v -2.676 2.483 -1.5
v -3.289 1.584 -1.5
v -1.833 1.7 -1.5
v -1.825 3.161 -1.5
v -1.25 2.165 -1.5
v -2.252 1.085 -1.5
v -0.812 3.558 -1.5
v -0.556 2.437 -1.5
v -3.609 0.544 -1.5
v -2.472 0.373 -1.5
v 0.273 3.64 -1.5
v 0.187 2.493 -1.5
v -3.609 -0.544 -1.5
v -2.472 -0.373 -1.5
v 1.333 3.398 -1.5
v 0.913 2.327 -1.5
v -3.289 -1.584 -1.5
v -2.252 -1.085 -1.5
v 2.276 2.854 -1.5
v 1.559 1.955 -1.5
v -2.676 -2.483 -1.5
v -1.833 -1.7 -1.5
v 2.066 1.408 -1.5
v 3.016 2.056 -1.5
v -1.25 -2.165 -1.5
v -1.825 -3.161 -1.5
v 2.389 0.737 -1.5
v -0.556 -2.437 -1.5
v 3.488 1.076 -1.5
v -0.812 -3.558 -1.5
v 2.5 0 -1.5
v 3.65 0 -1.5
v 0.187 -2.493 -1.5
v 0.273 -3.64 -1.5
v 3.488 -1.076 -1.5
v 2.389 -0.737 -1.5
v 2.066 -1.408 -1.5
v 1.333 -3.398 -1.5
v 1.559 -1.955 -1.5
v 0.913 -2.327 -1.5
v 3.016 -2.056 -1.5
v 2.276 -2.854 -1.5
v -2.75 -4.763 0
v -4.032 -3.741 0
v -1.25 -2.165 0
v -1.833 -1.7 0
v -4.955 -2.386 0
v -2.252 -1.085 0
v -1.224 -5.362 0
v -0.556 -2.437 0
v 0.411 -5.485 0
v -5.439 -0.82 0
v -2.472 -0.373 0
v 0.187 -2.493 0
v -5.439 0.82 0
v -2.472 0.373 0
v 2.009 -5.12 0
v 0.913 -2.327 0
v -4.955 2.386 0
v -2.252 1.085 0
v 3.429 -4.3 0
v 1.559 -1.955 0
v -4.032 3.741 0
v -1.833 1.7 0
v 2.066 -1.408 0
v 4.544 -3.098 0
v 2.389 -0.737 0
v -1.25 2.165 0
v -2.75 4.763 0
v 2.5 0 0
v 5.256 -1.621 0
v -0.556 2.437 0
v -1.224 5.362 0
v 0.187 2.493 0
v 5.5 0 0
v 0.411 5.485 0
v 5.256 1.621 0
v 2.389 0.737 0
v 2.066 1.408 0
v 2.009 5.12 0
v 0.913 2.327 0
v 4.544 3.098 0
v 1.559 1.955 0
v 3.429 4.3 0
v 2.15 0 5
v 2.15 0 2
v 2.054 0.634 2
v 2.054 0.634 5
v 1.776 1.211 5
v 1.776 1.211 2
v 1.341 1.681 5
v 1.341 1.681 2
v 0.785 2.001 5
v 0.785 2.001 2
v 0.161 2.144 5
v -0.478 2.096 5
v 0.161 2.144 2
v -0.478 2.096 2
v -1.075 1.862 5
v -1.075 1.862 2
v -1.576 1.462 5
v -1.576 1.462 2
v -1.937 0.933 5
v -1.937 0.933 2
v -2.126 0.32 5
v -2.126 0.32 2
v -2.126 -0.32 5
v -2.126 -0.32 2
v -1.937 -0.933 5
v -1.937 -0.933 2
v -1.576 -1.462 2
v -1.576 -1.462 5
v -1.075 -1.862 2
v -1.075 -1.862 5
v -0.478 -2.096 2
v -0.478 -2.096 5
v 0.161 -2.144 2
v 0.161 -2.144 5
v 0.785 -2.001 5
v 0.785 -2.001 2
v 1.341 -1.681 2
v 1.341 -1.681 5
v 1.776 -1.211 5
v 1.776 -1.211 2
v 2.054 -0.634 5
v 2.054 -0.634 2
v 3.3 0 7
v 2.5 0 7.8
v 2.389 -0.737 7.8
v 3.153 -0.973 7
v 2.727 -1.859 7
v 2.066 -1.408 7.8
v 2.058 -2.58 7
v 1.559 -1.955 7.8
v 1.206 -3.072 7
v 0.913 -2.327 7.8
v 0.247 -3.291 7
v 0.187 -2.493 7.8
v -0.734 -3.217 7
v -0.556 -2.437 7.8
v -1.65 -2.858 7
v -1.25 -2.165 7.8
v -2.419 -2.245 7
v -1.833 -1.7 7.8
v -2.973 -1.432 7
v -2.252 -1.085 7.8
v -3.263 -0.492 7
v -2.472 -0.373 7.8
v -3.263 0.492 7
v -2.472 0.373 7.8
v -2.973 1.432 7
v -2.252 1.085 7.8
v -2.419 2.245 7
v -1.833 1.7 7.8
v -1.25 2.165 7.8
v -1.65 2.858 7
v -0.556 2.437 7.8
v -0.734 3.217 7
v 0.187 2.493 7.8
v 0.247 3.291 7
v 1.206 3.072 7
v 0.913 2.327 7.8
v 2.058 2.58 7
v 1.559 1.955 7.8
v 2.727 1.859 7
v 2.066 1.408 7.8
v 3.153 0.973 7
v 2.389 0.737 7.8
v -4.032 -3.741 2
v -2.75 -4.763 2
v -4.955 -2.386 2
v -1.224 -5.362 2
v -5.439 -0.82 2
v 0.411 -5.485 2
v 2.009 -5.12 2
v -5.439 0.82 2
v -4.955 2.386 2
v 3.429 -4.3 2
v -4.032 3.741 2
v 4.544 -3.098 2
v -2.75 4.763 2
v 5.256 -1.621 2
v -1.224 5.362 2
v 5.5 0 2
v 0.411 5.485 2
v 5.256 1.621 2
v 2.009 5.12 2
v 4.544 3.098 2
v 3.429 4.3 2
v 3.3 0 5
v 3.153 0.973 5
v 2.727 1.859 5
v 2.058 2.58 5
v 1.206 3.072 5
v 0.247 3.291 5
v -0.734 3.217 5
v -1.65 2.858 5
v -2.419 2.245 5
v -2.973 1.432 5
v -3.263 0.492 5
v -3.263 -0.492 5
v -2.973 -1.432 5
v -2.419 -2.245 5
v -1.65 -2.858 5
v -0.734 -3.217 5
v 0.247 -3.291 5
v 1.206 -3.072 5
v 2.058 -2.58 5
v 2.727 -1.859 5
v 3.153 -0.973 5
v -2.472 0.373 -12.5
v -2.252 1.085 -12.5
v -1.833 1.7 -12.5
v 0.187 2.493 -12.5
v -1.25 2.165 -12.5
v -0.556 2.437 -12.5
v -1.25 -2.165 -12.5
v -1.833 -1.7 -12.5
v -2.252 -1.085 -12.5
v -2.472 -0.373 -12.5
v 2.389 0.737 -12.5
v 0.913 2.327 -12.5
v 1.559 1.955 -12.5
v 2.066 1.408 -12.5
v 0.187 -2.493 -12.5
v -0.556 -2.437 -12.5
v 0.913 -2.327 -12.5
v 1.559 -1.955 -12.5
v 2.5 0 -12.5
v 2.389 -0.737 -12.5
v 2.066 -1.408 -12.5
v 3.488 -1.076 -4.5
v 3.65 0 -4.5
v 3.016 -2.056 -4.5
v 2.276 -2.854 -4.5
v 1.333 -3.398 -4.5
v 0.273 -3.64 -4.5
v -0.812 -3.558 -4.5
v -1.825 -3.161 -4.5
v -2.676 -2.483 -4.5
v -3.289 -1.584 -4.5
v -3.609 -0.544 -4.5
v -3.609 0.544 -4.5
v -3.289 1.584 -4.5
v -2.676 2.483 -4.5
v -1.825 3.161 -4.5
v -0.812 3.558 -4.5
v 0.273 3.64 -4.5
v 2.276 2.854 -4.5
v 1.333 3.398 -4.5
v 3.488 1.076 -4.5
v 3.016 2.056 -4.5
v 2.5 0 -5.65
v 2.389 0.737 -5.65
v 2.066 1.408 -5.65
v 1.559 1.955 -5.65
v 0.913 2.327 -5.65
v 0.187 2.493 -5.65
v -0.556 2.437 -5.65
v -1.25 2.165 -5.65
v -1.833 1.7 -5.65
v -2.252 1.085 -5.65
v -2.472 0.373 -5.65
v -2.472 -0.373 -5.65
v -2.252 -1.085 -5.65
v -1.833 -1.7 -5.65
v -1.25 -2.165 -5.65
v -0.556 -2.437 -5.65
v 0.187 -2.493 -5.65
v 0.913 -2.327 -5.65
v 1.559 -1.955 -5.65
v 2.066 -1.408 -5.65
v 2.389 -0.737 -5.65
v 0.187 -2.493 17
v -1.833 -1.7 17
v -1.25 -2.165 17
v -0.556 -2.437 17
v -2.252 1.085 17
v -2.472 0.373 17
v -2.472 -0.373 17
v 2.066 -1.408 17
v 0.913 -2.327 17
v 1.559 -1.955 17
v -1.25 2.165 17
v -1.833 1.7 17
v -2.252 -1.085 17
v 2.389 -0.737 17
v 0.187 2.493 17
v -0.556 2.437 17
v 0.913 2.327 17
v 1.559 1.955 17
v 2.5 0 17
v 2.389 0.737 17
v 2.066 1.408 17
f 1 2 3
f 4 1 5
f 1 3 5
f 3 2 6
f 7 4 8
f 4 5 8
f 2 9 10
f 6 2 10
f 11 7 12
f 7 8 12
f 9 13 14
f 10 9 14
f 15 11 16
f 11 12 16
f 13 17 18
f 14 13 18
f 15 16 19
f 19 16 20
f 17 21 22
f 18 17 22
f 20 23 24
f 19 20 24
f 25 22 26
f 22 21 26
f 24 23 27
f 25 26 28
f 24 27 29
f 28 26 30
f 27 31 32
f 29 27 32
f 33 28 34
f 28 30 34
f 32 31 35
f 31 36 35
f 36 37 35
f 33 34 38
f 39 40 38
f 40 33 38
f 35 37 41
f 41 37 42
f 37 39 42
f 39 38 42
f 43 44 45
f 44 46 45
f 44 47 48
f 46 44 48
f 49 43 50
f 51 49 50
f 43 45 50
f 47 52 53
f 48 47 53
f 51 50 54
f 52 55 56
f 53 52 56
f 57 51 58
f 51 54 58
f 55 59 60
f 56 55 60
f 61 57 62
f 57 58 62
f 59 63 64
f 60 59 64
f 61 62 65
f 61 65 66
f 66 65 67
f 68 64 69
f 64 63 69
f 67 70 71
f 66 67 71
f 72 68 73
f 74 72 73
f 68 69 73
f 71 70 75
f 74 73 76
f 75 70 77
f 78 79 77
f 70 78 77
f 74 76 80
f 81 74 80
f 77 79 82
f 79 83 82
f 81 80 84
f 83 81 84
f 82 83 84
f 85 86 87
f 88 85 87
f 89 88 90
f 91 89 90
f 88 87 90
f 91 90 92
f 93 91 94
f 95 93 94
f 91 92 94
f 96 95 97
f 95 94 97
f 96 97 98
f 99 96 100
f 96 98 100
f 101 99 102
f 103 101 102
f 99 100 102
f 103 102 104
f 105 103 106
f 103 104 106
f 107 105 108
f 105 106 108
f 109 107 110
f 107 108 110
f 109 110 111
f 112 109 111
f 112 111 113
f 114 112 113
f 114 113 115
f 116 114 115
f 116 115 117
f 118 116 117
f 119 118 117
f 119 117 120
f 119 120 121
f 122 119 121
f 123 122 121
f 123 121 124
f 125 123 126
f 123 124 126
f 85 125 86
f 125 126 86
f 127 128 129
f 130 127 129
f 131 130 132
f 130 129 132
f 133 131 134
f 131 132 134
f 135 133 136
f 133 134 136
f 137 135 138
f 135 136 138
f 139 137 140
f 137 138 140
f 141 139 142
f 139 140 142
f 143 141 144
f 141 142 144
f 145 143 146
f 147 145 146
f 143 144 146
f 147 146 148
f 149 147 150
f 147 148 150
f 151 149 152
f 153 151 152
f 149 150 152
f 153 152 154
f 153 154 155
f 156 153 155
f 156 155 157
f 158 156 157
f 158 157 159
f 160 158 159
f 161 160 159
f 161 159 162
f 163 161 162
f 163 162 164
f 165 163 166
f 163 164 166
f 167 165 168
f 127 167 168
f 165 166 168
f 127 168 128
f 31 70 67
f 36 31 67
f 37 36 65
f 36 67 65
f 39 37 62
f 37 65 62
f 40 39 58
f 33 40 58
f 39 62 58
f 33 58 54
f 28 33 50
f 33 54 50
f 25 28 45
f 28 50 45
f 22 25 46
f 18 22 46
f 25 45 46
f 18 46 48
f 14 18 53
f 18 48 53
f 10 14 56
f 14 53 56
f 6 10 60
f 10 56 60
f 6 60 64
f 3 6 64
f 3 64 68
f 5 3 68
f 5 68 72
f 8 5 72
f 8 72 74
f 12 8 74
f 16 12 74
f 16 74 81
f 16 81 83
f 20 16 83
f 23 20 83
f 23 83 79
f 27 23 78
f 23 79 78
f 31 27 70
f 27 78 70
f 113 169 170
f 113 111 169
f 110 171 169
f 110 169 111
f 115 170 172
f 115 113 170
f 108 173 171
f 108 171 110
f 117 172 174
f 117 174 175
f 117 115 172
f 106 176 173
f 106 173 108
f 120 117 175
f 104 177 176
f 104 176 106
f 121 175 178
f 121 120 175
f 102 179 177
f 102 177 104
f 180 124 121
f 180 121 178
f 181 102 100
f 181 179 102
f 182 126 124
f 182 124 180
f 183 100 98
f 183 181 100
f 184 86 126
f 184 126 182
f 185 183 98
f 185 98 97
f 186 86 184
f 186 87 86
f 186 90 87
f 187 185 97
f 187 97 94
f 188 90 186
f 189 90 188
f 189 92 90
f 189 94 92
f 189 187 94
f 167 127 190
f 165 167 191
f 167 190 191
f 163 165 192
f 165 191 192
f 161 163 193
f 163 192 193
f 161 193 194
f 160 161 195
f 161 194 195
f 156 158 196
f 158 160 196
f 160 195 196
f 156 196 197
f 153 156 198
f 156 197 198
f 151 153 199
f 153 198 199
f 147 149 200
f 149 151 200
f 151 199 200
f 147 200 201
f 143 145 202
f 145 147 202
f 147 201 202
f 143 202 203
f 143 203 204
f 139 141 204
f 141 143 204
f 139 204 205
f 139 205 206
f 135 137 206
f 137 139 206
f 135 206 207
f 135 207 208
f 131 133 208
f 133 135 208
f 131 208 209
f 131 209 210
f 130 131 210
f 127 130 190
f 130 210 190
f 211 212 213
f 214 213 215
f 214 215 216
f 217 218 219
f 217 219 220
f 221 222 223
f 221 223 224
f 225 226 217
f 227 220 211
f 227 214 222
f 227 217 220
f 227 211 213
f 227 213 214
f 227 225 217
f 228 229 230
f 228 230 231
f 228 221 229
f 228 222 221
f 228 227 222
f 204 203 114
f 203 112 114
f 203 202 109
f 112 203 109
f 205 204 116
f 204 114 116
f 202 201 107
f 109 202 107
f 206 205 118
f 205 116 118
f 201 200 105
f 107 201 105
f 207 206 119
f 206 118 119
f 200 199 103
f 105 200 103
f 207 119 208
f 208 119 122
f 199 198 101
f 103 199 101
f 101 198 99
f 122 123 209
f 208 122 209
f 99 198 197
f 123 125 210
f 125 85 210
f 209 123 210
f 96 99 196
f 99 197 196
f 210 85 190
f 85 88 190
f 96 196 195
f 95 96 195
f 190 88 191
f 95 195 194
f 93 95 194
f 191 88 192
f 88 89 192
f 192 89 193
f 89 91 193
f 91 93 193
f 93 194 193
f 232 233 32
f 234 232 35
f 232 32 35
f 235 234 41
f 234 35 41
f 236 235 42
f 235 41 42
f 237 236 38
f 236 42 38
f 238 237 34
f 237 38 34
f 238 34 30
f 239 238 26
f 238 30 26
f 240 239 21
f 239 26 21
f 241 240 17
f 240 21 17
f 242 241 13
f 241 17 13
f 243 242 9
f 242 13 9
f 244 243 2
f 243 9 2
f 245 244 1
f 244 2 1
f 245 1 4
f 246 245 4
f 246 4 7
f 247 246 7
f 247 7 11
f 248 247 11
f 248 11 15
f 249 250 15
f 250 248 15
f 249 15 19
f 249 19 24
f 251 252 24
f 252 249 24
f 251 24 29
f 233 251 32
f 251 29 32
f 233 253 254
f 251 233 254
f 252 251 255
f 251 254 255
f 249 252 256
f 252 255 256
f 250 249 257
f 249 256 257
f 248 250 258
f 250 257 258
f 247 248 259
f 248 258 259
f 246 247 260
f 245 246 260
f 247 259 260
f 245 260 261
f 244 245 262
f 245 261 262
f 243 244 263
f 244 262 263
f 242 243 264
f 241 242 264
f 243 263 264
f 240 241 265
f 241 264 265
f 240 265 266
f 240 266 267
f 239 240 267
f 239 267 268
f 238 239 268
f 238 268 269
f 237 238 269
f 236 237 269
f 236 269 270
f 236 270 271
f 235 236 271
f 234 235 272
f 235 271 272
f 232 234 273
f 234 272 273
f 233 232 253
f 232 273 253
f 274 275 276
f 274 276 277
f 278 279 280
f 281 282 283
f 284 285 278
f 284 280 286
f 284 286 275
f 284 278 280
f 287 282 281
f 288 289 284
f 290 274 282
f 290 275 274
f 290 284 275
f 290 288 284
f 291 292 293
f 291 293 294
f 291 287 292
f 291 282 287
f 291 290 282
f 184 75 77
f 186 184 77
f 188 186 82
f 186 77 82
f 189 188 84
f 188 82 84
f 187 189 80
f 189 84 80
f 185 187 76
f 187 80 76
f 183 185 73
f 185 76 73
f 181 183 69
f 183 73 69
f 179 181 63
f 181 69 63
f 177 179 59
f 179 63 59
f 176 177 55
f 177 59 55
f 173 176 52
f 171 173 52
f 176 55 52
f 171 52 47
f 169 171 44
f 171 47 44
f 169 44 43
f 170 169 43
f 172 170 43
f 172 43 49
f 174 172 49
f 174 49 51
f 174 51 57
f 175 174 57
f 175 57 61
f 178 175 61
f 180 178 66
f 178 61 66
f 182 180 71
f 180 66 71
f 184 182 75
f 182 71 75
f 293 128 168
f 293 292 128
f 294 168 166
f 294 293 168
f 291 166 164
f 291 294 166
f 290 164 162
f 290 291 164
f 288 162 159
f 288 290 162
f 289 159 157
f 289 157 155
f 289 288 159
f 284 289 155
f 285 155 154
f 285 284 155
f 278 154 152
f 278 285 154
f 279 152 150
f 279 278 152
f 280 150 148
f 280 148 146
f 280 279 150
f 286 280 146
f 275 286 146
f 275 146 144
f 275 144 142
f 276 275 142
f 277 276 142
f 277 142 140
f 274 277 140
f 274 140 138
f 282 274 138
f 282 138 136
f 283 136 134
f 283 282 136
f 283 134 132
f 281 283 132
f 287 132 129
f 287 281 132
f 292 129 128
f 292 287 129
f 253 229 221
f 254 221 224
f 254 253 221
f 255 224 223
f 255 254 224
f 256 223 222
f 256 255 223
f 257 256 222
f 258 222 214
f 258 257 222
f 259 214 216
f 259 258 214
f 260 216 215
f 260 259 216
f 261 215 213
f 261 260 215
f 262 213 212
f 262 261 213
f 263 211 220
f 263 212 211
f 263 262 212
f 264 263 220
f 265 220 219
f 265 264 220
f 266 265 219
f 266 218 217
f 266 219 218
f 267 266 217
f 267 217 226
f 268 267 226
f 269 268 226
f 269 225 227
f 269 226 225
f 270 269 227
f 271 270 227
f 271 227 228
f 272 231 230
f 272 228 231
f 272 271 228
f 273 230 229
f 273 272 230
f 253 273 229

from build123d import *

# Parameters (mm, degrees)
F0_R         = 5.5
F1_DEPTH     = 2
F2_R         = 2.15
F3_DEPTH     = 3
F4_R         = 3.3
F5_DEPTH     = 12
F6_R         = 5
F6_R_2       = 2.5
F7_DEPTH     = 7
F8_S5_R      = 2.5
F8_T6_DEPTH  = 6
F9_R         = 2.5
F10_DEPTH    = 1.5
F11_R        = 3.65
F12_DEPTH    = 11
F13_R        = 5
F13_R_2      = 2.5
F14_DEPTH    = 5
F15_S5_R     = 2.5
F15_T6_DEPTH = 7


# Not quite as in the source:
# - a fillet or chamfer that OpenCascade refuses, or shapes differently, is made with other operations: its cross-section is extruded or revolved along the edge and cut away or added


with BuildPart() as f1:
    # F0 (on Top) → F1 (new body)
    with BuildSketch(Plane.XY):
        Circle(F0_R)
    extrude(amount=F1_DEPTH)

    # F2 (on face) → F3 (join)
    with BuildSketch(Plane.XY.offset(2)):
        Circle(F2_R)
    extrude(amount=F3_DEPTH)

    # F4 (on face) → F5 (join)
    with BuildSketch(Plane.XY.offset(5)):
        Circle(F4_R)
    extrude(amount=F5_DEPTH)

    # F6 (on face) → F7 (cut)
    with BuildSketch(Plane.XY.offset(17)):
        Circle(F6_R)
        Circle(F6_R_2, mode=Mode.SUBTRACT)
    extrude(amount=-F7_DEPTH, mode=Mode.SUBTRACT)

    # F8: chamfer of 3 on 1 edges, made by hand


with BuildPart() as f8_tool2:
    # F8_s3 → F8_t4 (revolve)
    with BuildSketch(Plane.XZ):
        Polygon((3.3, 7), (0.3, 10), (3.3, 10), align=None)
    revolve(axis=Axis((0, 0, 10), (0, 0, -1)))

    # F8_s5 → F8_t6 (cut, symmetric)
    with BuildSketch(Plane.XY.offset(8.5)):
        Circle(F8_S5_R)
    extrude(amount=F8_T6_DEPTH, both=True, mode=Mode.SUBTRACT)


with BuildPart() as f1_1:
    add(f1.part)

    # F8_t1: cut F8_tool2
    add(f8_tool2.part, mode=Mode.SUBTRACT)

    # F9 (on face) → F10 (join)
    with BuildSketch(Plane(origin=(0, 0, 0), x_dir=(1, 0, 0), z_dir=(0, 0, -1))):
        Circle(F9_R)
    extrude(amount=F10_DEPTH)

    # F11 (on face) → F12 (join)
    with BuildSketch(Plane(origin=(0, 0, -1.5), x_dir=(1, 0, 0), z_dir=(0, 0, -1))):
        Circle(F11_R)
    extrude(amount=F12_DEPTH)

    # F13 (on face) → F14 (cut)
    with BuildSketch(Plane(origin=(0, 0, -12.5), x_dir=(1, 0, 0), z_dir=(0, 0, -1))):
        Circle(F13_R)
        Circle(F13_R_2, mode=Mode.SUBTRACT)
    extrude(amount=-F14_DEPTH, mode=Mode.SUBTRACT)

    # F15: chamfer of 3 on 1 edges, made by hand


with BuildPart() as f15_tool2:
    # F15_s3 → F15_t4 (revolve)
    with BuildSketch(Plane.XZ):
        Polygon((3.65, -4.5), (0.65, -7.5), (3.65, -7.5), align=None)
    revolve(axis=Axis((0, 0, -7.5), (0, 0, 1)))

    # F15_s5 → F15_t6 (cut, symmetric)
    with BuildSketch(Plane.XY.offset(-6)):
        Circle(F15_S5_R)
    extrude(amount=F15_T6_DEPTH, both=True, mode=Mode.SUBTRACT)


with BuildPart() as f1_2:
    add(f1_1.part)

    # F15_t1: cut F15_tool2
    add(f15_tool2.part, mode=Mode.SUBTRACT)


solid = f1_2.part
